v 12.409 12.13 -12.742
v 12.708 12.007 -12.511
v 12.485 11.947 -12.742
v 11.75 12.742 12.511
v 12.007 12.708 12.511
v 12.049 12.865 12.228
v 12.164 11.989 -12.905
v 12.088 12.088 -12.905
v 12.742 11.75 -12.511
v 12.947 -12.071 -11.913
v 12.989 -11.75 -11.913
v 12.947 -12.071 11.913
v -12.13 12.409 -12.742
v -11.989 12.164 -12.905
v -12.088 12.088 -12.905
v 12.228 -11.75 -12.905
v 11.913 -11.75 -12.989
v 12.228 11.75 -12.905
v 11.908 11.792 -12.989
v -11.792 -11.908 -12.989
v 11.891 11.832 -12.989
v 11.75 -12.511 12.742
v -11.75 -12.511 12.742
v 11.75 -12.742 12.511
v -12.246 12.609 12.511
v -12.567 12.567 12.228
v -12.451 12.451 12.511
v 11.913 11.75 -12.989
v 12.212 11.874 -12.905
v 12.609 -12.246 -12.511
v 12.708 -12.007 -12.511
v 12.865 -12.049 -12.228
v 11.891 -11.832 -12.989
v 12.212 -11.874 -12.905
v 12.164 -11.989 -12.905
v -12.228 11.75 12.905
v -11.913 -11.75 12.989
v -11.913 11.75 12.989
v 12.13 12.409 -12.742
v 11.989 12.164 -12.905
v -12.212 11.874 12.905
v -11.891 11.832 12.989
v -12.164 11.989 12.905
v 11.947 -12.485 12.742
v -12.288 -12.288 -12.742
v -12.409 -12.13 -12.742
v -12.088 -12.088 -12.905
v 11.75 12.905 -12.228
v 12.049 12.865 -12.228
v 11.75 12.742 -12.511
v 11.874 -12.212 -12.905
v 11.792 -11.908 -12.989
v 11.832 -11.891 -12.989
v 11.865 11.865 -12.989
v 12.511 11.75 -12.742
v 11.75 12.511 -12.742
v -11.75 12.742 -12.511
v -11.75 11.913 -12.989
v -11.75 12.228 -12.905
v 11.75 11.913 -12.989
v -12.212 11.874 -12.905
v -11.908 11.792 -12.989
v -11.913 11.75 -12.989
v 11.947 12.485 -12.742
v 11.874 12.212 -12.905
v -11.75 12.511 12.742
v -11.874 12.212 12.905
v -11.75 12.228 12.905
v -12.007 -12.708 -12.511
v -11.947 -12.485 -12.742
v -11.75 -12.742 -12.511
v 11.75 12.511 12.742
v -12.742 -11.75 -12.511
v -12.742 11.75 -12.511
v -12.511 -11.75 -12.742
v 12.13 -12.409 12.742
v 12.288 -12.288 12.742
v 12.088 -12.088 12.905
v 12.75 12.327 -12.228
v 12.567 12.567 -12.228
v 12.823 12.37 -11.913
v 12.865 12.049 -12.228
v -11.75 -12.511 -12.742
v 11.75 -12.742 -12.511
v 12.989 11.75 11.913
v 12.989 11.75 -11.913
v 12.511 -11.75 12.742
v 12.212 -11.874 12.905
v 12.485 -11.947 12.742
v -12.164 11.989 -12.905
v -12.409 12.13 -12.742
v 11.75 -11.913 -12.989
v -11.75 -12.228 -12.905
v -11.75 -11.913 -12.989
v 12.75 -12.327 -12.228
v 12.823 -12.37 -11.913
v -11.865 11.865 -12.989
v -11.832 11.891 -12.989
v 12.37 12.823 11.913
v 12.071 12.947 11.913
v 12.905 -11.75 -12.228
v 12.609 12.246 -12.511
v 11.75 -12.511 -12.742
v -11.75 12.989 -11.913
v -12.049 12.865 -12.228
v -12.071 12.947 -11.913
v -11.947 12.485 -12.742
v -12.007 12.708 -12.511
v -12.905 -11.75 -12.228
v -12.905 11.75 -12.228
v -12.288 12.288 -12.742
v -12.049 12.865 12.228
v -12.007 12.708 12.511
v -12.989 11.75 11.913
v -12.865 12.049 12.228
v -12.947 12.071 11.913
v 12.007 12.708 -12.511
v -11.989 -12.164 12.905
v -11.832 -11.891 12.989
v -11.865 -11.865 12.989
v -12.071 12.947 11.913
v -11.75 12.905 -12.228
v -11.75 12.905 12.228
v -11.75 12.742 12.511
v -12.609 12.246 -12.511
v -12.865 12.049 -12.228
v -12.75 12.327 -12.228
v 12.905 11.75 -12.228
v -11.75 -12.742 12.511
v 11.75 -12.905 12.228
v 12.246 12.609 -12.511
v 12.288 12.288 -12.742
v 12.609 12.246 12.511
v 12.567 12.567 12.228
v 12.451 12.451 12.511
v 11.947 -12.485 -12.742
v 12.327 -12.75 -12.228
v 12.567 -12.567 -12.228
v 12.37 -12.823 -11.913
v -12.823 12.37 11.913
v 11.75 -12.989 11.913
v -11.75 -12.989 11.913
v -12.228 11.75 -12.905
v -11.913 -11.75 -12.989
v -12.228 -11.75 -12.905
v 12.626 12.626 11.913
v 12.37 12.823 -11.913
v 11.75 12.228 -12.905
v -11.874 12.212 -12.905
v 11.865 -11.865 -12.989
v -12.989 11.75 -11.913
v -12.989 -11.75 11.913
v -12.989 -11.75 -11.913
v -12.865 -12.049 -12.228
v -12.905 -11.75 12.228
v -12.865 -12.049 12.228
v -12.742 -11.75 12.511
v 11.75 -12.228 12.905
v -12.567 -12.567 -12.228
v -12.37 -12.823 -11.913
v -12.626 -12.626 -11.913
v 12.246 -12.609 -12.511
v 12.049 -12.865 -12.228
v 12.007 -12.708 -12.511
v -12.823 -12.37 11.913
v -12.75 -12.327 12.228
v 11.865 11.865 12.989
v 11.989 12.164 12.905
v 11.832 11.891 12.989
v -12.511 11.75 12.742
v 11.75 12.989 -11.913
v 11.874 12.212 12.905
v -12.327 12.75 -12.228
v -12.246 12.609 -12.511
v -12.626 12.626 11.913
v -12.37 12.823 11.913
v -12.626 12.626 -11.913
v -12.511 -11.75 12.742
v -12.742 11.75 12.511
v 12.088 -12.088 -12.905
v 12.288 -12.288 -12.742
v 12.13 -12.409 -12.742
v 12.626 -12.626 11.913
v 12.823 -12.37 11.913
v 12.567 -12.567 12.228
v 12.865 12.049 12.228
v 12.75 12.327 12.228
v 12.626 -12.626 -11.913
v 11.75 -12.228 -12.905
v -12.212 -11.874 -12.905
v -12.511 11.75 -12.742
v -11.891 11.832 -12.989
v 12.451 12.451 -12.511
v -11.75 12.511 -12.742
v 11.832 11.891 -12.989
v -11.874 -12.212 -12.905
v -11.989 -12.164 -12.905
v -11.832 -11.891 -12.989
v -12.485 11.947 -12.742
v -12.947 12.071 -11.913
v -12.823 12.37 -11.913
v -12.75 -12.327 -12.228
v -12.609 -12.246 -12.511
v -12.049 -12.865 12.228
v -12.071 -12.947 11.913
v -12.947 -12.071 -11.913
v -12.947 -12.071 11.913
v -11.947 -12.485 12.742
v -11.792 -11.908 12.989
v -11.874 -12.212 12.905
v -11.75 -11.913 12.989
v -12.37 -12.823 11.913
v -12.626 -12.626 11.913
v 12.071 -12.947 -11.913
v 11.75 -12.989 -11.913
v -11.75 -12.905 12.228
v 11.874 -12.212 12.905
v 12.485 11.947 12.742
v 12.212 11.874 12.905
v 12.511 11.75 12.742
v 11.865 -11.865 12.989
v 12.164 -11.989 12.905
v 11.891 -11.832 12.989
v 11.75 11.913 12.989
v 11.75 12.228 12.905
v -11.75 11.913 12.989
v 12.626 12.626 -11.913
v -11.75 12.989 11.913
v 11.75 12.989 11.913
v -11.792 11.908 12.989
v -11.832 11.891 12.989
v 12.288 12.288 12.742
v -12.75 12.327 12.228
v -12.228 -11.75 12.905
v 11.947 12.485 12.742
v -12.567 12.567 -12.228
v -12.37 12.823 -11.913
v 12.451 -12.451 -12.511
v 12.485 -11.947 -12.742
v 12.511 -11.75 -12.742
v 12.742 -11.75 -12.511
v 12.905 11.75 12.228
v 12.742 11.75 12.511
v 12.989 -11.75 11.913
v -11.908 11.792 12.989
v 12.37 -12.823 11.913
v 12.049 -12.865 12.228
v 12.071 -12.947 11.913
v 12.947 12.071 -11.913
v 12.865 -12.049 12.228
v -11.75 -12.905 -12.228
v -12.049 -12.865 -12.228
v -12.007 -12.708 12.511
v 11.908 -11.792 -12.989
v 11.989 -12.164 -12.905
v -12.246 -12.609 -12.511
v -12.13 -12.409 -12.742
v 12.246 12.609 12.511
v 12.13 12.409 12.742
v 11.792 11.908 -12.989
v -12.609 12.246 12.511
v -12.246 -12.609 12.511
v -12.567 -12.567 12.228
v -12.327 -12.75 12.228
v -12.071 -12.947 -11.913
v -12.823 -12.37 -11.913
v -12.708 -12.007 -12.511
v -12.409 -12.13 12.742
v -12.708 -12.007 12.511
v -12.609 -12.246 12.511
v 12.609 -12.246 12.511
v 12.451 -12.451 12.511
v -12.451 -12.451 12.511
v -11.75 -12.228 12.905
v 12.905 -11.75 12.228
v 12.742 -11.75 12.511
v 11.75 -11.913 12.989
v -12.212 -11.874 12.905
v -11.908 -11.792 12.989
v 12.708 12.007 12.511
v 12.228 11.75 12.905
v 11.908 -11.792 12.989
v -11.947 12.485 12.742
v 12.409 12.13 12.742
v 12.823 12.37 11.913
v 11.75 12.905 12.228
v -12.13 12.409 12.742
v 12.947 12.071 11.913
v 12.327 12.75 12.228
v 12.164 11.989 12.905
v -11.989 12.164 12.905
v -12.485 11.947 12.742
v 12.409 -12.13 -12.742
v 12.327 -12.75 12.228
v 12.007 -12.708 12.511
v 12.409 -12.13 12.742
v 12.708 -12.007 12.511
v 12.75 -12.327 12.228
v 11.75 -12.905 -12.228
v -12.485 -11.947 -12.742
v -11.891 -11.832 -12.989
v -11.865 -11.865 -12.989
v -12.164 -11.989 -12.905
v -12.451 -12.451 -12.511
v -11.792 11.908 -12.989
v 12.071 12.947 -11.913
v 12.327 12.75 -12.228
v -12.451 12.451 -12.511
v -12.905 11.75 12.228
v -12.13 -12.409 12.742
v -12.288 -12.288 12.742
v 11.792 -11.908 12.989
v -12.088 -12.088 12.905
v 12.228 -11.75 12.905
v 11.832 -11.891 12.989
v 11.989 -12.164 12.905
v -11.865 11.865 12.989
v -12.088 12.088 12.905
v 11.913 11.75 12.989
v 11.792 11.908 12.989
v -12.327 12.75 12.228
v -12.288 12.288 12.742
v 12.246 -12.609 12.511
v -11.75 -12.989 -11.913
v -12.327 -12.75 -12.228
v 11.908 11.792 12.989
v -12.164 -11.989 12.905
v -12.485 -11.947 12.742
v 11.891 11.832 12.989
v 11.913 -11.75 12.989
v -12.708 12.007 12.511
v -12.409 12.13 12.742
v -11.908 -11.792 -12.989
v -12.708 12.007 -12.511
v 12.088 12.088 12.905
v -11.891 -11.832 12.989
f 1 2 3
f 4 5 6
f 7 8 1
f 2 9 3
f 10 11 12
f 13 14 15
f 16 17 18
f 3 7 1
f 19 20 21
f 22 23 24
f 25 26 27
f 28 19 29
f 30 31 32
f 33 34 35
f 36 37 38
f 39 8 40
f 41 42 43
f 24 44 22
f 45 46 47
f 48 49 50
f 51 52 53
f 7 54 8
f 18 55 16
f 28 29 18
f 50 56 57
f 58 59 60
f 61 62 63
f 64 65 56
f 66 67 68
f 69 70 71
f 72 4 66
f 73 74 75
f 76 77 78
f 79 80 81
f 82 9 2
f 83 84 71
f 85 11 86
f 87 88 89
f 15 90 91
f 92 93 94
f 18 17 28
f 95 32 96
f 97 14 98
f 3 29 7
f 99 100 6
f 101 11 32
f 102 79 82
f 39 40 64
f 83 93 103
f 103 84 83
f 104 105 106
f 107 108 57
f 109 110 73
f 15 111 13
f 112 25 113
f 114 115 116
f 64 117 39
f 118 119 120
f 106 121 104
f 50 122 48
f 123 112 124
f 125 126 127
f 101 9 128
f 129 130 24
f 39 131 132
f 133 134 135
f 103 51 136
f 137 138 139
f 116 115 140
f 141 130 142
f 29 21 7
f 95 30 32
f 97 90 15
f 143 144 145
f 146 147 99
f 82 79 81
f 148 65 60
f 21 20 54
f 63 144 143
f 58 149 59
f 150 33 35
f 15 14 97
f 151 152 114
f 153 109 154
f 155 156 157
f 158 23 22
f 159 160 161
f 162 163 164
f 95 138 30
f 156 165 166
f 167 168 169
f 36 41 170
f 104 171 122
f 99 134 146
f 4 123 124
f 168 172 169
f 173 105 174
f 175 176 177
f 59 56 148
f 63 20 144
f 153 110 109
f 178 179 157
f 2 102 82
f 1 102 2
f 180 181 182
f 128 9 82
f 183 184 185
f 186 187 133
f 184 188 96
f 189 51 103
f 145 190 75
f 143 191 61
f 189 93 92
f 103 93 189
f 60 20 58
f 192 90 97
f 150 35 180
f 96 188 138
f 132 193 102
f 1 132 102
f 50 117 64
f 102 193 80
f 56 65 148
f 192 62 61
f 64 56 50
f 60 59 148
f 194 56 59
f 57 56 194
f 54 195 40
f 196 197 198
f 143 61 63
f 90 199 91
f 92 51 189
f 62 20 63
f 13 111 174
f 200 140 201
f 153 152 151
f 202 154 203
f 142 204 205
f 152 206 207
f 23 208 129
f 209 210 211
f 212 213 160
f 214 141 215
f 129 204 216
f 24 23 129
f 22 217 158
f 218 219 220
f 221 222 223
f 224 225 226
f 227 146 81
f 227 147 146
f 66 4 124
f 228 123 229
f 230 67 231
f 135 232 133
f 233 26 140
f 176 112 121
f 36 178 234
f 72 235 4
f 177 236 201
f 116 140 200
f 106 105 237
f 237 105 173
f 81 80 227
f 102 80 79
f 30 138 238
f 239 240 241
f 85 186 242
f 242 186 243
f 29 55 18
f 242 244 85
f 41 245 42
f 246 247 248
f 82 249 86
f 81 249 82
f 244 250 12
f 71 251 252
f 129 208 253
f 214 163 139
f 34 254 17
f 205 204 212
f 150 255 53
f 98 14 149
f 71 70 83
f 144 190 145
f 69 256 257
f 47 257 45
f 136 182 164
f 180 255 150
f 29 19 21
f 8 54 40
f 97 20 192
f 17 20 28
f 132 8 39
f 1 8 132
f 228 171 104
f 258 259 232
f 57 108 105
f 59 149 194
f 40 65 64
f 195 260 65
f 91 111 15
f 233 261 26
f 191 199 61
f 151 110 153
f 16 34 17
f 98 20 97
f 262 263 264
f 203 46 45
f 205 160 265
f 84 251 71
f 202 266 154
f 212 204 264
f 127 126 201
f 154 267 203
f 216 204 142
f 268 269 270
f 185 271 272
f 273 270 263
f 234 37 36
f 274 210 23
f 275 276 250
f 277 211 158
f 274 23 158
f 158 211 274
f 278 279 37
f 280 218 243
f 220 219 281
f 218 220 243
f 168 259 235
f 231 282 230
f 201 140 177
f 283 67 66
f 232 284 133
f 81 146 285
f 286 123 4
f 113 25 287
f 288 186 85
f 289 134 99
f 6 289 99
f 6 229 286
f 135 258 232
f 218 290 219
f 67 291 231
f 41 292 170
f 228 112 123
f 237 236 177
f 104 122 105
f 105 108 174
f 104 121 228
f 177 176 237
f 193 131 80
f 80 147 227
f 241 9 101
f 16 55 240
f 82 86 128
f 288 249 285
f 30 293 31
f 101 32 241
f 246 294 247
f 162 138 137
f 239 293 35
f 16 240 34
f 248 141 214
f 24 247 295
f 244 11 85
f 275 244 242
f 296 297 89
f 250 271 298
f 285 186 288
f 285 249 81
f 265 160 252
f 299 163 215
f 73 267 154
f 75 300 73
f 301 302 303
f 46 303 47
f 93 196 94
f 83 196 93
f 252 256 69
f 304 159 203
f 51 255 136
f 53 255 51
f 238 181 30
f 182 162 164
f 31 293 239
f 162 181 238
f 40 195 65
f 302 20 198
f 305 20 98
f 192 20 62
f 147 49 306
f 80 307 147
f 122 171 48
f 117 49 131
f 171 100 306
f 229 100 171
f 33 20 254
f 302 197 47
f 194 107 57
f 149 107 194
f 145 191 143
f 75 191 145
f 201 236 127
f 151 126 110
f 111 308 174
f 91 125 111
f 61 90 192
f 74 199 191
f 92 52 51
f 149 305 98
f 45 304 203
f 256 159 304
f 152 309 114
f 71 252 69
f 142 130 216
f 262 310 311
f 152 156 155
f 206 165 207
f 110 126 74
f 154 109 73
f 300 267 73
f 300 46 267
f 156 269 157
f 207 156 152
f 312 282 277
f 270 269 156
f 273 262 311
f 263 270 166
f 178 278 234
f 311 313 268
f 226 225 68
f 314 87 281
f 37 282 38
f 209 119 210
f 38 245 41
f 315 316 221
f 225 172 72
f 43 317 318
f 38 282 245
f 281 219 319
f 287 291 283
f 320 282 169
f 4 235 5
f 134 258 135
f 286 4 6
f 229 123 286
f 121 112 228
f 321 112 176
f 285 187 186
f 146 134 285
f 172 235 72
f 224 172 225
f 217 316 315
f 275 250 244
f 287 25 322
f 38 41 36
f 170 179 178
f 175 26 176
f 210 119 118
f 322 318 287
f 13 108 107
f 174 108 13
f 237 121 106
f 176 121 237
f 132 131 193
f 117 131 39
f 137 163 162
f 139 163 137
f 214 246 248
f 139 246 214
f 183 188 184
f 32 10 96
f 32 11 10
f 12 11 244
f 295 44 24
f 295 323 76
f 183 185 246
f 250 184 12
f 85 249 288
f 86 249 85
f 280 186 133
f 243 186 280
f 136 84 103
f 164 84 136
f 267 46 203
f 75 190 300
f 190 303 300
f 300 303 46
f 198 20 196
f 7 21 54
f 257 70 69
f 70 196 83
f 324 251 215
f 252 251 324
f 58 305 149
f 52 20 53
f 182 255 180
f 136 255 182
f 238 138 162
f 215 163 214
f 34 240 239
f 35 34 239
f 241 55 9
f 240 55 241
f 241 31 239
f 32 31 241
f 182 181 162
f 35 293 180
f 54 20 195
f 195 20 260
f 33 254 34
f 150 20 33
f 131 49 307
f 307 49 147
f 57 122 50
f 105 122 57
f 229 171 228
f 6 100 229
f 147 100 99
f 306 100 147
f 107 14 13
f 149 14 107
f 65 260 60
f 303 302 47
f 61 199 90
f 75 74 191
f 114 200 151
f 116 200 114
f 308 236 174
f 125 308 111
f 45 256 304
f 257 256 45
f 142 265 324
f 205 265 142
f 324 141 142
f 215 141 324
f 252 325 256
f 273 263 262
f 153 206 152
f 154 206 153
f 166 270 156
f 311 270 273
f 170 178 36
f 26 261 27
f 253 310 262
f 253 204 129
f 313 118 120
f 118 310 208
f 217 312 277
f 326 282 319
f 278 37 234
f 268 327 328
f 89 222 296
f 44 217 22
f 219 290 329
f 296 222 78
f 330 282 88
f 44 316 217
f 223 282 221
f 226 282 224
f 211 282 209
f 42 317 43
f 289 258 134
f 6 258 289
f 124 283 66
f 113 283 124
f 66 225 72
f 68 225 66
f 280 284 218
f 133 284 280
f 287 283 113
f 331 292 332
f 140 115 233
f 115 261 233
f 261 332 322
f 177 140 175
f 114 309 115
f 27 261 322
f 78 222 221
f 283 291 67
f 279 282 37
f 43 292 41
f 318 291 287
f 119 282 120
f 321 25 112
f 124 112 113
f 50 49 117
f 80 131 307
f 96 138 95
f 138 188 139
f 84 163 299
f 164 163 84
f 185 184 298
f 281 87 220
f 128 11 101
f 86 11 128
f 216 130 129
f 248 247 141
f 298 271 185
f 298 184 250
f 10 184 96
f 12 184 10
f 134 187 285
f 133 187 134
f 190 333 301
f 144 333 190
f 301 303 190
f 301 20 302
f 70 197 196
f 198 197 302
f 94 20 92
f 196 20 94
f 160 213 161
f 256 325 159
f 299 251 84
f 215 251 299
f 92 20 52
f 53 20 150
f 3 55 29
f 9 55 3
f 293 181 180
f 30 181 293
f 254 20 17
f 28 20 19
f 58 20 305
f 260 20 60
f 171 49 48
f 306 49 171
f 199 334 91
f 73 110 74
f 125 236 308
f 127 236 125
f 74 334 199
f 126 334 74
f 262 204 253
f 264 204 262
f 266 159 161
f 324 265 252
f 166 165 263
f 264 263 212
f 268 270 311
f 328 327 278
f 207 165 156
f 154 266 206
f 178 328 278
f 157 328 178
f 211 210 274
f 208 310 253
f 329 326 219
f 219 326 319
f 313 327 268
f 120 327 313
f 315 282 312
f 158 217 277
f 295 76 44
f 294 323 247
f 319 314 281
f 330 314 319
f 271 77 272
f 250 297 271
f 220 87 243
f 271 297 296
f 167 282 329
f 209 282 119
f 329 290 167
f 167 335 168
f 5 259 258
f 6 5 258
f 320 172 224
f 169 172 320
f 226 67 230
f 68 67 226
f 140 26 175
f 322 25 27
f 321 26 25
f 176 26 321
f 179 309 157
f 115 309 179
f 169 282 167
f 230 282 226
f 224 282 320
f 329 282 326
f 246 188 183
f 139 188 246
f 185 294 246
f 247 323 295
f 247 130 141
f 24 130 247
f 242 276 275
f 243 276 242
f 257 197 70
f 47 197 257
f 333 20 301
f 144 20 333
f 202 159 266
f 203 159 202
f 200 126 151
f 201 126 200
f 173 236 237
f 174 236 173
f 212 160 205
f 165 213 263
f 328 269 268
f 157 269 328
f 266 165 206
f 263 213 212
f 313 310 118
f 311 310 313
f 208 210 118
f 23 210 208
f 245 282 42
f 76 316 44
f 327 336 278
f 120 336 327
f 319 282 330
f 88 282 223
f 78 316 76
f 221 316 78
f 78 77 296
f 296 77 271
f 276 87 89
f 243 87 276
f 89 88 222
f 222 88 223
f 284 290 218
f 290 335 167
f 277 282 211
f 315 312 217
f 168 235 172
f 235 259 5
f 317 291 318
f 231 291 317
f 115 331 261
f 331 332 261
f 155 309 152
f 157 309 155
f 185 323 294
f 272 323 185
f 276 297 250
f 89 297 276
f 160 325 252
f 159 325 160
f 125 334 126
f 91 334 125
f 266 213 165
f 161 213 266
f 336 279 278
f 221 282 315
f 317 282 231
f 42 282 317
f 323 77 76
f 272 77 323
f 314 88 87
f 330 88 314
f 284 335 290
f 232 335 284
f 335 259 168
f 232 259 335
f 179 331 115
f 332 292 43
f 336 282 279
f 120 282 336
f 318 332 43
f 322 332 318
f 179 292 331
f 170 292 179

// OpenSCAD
// Reproduces server_rack_modular_v4/v8 parts/node.scad exactly (2026-09-12).
// Declared bbox 26.0; a 24-facet sphere in the minkowski() makes it 25.9786.
$fa = 2; $fs = 0.3;
node_s = 26;
fillet = 2.5;

minkowski() {
    cube([node_s - fillet, node_s - fillet, node_s - fillet], center = true);
    sphere(r = fillet / 2, $fn = 24);
}
